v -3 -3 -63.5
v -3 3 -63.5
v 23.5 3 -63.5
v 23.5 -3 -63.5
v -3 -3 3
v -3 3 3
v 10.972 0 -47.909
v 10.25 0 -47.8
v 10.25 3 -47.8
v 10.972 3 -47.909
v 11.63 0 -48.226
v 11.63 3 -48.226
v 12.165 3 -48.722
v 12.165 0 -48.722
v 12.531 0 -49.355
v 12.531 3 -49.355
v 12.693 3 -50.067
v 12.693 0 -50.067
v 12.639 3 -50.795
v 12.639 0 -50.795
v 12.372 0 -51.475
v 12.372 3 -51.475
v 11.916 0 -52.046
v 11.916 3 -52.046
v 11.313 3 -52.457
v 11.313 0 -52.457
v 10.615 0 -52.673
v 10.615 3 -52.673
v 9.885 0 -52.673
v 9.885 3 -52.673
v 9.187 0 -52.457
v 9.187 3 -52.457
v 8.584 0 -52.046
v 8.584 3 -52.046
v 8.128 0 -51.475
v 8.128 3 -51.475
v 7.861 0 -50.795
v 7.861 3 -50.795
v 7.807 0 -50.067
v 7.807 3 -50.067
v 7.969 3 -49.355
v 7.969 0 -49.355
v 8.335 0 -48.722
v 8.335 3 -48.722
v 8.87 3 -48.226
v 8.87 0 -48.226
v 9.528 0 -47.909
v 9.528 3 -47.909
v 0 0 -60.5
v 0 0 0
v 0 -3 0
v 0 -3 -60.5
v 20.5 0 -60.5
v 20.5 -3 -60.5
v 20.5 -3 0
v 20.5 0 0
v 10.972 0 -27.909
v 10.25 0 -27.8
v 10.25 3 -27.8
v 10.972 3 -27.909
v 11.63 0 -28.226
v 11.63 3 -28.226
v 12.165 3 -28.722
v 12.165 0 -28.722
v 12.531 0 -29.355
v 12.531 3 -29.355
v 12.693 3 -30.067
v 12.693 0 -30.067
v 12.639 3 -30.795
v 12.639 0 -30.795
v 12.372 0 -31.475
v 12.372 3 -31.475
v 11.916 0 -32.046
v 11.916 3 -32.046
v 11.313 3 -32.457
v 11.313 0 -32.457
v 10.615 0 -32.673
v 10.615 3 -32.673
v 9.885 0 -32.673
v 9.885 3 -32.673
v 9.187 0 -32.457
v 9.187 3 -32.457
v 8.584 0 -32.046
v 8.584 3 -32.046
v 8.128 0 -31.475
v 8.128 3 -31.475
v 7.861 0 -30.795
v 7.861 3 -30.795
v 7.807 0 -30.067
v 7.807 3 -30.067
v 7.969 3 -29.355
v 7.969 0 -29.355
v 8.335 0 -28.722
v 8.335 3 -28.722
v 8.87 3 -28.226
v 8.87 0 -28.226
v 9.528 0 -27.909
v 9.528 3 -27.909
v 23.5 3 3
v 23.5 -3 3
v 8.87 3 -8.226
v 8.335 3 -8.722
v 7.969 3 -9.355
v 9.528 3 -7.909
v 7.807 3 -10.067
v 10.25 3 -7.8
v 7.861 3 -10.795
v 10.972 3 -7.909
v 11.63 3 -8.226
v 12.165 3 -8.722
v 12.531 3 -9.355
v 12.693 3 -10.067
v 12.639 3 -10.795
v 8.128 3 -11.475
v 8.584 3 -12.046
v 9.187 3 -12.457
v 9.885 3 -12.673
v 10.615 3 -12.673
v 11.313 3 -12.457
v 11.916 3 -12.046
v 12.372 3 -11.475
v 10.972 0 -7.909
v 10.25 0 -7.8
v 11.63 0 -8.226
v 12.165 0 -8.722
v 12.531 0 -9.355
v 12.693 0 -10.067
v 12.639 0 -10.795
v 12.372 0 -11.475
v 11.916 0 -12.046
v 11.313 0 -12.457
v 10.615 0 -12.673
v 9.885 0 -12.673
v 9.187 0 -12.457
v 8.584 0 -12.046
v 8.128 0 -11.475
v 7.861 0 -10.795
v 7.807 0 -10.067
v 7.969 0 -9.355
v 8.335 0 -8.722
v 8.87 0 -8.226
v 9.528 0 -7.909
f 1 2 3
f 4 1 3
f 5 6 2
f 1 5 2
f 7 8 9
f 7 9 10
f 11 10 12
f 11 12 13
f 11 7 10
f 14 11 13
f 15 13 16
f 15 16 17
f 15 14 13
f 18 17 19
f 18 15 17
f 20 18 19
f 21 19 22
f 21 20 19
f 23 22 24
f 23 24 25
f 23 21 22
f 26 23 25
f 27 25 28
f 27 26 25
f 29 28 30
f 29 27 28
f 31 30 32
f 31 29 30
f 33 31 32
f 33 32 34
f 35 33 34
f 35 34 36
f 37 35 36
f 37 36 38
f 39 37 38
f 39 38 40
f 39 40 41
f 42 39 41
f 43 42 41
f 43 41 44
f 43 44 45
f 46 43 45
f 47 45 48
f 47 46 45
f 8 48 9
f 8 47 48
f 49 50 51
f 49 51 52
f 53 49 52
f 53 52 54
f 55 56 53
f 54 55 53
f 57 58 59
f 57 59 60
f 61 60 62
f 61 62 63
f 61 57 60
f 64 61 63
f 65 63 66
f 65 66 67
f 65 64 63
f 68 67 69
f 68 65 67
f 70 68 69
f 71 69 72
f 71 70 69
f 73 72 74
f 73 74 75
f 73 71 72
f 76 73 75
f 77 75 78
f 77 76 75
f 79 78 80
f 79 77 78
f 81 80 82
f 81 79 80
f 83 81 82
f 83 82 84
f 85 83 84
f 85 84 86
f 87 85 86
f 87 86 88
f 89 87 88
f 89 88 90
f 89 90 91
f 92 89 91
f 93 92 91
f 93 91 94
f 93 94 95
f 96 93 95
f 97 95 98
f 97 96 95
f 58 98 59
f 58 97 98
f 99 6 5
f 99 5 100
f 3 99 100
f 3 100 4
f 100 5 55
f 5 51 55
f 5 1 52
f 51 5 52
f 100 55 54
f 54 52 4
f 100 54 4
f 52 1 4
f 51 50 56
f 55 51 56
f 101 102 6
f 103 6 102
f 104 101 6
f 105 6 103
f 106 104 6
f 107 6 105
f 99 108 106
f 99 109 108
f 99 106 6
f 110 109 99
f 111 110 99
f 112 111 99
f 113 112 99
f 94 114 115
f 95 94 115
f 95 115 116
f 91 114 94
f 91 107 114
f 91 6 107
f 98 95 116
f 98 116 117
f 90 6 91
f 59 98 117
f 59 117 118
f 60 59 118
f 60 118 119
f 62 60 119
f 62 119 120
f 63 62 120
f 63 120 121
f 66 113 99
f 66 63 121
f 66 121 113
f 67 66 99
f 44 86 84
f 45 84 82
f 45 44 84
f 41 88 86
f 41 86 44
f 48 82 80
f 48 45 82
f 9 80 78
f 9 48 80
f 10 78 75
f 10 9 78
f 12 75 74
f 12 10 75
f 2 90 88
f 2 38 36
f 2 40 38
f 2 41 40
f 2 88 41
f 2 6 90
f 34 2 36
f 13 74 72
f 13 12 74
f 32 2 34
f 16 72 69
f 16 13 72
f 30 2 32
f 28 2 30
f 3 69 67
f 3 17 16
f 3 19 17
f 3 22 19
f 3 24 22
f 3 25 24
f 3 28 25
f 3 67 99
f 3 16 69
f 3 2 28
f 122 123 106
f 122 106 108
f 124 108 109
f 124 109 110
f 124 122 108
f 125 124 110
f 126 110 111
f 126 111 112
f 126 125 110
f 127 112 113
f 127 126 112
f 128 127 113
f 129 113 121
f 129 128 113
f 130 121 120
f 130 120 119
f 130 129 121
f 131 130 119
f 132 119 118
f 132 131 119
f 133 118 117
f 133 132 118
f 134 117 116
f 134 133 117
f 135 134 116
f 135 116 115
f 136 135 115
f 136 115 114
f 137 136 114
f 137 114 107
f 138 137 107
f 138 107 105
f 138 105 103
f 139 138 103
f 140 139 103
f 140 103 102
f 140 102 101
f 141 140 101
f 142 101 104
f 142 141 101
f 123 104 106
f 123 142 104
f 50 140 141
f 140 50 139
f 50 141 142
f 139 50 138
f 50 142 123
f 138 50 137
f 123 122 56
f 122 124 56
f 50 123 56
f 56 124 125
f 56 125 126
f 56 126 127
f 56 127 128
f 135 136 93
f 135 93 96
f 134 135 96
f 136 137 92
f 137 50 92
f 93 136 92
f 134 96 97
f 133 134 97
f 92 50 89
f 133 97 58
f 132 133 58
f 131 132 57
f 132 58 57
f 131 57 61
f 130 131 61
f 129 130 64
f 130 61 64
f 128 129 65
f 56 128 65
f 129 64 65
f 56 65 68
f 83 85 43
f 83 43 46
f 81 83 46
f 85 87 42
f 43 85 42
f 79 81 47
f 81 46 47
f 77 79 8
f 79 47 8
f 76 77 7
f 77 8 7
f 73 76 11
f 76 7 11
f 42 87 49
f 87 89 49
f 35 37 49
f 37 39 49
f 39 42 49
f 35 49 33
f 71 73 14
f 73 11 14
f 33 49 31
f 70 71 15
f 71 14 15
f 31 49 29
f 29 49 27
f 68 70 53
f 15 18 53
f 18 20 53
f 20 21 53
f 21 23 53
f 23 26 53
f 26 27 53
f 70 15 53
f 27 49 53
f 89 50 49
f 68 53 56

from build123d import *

# Parameters (mm, degrees)
SKETCH1_W           = 20.5
SKETCH1_H           = 60.5
SKETCH1_R           = 2.45
BOSS_EXTRUDE1_DEPTH = 3
SKETCH2_W           = 26.5
SKETCH2_H           = 66.5
SKETCH2_W_2         = 20.5
SKETCH2_H_2         = 60.5
BOSS_EXTRUDE2_DEPTH = 6


with BuildPart() as part:
    # Sketch1 → Boss-Extrude1 (new body)
    with BuildSketch(Plane(origin=(0, 0, 0), x_dir=(1, 0, 0), z_dir=(0, 1, 0))):
        with Locations((10.25, 30.25)):
            Rectangle(SKETCH1_W, SKETCH1_H)
        with Locations(Location((10.25, 10.25, 0), (0, 0, 270))):
            Circle(SKETCH1_R, mode=Mode.SUBTRACT)
        with Locations(Location((10.25, 50.25, 0), (0, 0, 270))):
            Circle(SKETCH1_R, mode=Mode.SUBTRACT)
        with Locations(Location((10.25, 30.25, 0), (0, 0, 270))):
            Circle(SKETCH1_R, mode=Mode.SUBTRACT)
    extrude(amount=BOSS_EXTRUDE1_DEPTH)

    # Sketch2 → Boss-Extrude2 (add)
    with BuildSketch(Plane(origin=(0, 3, 0), x_dir=(1, 0, 0), z_dir=(0, 1, 0))):
        with Locations((10.25, 30.25)):
            Rectangle(SKETCH2_W, SKETCH2_H)
        with Locations((10.25, 30.25)):
            Rectangle(SKETCH2_W_2, SKETCH2_H_2, mode=Mode.SUBTRACT)
    extrude(amount=-BOSS_EXTRUDE2_DEPTH)


solid = part.part
